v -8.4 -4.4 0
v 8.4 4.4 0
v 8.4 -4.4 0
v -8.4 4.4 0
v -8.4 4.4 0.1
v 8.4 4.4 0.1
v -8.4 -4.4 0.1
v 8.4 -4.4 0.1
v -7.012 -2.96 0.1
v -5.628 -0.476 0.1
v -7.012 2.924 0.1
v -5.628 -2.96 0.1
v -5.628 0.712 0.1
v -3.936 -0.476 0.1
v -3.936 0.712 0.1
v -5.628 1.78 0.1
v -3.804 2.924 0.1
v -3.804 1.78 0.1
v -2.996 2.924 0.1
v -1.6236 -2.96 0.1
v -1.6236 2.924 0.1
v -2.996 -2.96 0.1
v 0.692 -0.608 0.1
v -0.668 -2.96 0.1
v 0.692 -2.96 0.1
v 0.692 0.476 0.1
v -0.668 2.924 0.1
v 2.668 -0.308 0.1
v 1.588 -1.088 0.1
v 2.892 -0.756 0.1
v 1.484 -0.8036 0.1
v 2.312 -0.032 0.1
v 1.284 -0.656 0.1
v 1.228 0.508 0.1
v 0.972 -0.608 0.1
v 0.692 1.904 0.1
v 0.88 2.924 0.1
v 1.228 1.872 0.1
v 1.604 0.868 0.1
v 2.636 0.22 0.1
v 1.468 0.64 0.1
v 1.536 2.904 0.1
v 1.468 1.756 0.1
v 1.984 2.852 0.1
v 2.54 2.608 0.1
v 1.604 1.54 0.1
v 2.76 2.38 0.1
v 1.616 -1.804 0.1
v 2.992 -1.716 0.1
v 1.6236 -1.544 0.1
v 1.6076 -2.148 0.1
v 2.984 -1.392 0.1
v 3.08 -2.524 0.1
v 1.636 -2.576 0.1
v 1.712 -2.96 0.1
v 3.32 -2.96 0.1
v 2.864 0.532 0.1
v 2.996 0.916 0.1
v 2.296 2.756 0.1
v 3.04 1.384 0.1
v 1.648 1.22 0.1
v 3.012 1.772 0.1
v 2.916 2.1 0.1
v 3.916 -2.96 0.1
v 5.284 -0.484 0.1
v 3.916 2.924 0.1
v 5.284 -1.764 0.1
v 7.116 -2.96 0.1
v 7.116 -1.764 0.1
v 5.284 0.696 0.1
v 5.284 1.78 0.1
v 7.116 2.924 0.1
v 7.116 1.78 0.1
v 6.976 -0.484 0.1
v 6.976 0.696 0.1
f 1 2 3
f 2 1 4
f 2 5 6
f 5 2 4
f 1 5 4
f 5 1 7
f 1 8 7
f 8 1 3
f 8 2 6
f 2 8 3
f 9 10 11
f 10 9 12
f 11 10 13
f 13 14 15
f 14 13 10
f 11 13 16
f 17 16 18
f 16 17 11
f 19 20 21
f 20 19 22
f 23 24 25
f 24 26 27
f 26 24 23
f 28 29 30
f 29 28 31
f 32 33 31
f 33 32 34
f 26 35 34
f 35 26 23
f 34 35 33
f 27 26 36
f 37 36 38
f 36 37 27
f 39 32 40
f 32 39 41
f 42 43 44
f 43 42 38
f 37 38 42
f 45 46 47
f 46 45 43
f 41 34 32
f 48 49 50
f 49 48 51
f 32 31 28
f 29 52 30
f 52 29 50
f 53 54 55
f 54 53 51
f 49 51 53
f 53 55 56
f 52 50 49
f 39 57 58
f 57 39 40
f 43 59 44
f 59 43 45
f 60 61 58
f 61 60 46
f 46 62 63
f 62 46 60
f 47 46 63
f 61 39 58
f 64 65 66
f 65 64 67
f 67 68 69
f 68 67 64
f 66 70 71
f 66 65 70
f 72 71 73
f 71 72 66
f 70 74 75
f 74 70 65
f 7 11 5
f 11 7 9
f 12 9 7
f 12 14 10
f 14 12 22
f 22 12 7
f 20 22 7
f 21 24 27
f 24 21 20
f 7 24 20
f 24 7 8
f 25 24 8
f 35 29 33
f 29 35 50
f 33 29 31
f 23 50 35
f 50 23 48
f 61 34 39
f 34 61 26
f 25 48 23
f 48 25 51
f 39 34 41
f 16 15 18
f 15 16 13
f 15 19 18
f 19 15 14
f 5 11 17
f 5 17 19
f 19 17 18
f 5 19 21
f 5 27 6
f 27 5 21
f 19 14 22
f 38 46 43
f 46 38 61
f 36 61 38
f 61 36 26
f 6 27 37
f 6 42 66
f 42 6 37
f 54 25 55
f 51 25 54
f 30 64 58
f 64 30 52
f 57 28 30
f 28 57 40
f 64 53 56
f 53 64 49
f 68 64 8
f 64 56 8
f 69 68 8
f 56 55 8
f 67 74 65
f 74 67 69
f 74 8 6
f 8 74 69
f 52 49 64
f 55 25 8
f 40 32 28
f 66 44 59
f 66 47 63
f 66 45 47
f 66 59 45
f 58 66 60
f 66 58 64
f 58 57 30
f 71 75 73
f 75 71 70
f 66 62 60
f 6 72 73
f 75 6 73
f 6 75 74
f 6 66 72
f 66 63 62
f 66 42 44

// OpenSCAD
// file: ../p/box5-12.scad
use <../lib.scad>
function ldraw_lib__box5_12() = [
// 0 Box with 5 Faces without Any Edges
// 0 Name: box5-12.dat
// 0 Author: Chris Dee [cwdee]
// 0 !LDRAW_ORG Primitive UPDATE 2009-02
// 0 !LICENSE Licensed under CC BY 4.0 : see CAreadme.txt
// 
// 0 BFC CERTIFY CCW
  [0,"BFC","CERTIFY"],
  [0,"BFC","CCW"],
// 
// 0 !HISTORY 2009-09-03 [PTadmin] Official Update 2009-02
// 
// 
// 4 16 1 1 1 1 1 -1 -1 1 -1 -1 1 1
  [4,16,1,1,1,1,1,-1,-1,1,-1,-1,1,1],
// 4 16 -1 0 1 1 0 1 1 1 1 -1 1 1
  [4,16,-1,0,1,1,0,1,1,1,1,-1,1,1],
// 4 16 -1 0 -1 -1 0 1 -1 1 1 -1 1 -1
  [4,16,-1,0,-1,-1,0,1,-1,1,1,-1,1,-1],
// 4 16 1 0 -1 -1 0 -1 -1 1 -1 1 1 -1
  [4,16,1,0,-1,-1,0,-1,-1,1,-1,1,1,-1],
// 4 16 1 0 1 1 0 -1 1 1 -1 1 1 1
  [4,16,1,0,1,1,0,-1,1,1,-1,1,1,1],
// 0
];
module ldraw_lib__box5_12(step=0, col=false, unit=2/5, alt=false, line=0.2, solid=!$preview)
    makepoly(ldraw_lib__box5_12(), step=step, col=col, unit=unit, alt=alt, line=line, solid=solid);
ldraw_lib__box5_12(line=0.2);
// main file
use <../lib.scad>
use <../p/box5-12.scad>
function ldraw_lib__4262483c() = [
// 0 Sticker  1.1 x  2.1 with White "FIRE" on Transparent Background
// 0 Name: 4262483c.dat
// 0 Author: Takeshi Takahashi [RainbowDolphin]
// 0 !LDRAW_ORG Part UPDATE 2025-05
// 0 !LICENSE Licensed under CC BY 4.0 : see CAreadme.txt
// 
// 0 BFC CERTIFY CCW
  [0,"BFC","CERTIFY"],
  [0,"BFC","CCW"],
// 
// 0 !KEYWORDS BrickLink 7239stk01, Fire engine, Ladder truck, Rebrickable 52888
// 0 !KEYWORDS Set 7239
// 
// 0 !HISTORY 2025-05-28 [OrionP] Official Update 2025-05
// 
// 1 16 0 -0.25 0 21 0 0 0 0.25 0 0 0 11 box5-12.dat
  [1,16,0,-0.25,0,21,0,0,0,0.25,0,0,0,11, ldraw_lib__box5_12()],
// 0 BFC NOCLIP
  [0,"BFC","NOCLIP"],
// 4 15 -17.53 -0.25 -7.4 -14.07 -0.25 -7.4 -14.07 -0.25 -1.19 -17.53 -0.25 7.31
  [4,15,-17.53,-0.25,-7.4,-14.07,-0.25,-7.4,-14.07,-0.25,-1.19,-17.53,-0.25,7.31],
// 3 15 -17.53 -0.25 7.31 -14.07 -0.25 -1.19 -14.07 -0.25 1.78
  [3,15,-17.53,-0.25,7.31,-14.07,-0.25,-1.19,-14.07,-0.25,1.78],
// 4 15 -14.07 -0.25 1.78 -14.07 -0.25 -1.19 -9.84 -0.25 -1.19 -9.84 -0.25 1.78
  [4,15,-14.07,-0.25,1.78,-14.07,-0.25,-1.19,-9.84,-0.25,-1.19,-9.84,-0.25,1.78],
// 3 15 -17.53 -0.25 7.31 -14.07 -0.25 1.78 -14.07 -0.25 4.45
  [3,15,-17.53,-0.25,7.31,-14.07,-0.25,1.78,-14.07,-0.25,4.45],
// 4 15 -14.07 -0.25 4.45 -9.51 -0.25 4.45 -9.51 -0.25 7.31 -17.53 -0.25 7.31
  [4,15,-14.07,-0.25,4.45,-9.51,-0.25,4.45,-9.51,-0.25,7.31,-17.53,-0.25,7.31],
// 4 15 -7.49 -0.25 7.31 -7.49 -0.25 -7.4 -4.059 -0.25 -7.4 -4.059 -0.25 7.31
  [4,15,-7.49,-0.25,7.31,-7.49,-0.25,-7.4,-4.059,-0.25,-7.4,-4.059,-0.25,7.31],
// 3 15 1.73 -0.25 -1.52 -1.67 -0.25 -7.4 1.73 -0.25 -7.4
  [3,15,1.73,-0.25,-1.52,-1.67,-0.25,-7.4,1.73,-0.25,-7.4],
// 4 15 -1.67 -0.25 -7.4 1.73 -0.25 -1.52 1.73 -0.25 1.19 -1.67 -0.25 7.31
  [4,15,-1.67,-0.25,-7.4,1.73,-0.25,-1.52,1.73,-0.25,1.19,-1.67,-0.25,7.31],
// 4 15 6.67 -0.25 -0.77 3.71 -0.25 -2.009 3.97 -0.25 -2.72 7.23 -0.25 -1.89
  [4,15,6.67,-0.25,-0.77,3.71,-0.25,-2.009,3.97,-0.25,-2.72,7.23,-0.25,-1.89],
// 4 15 3.21 -0.25 -1.64 3.71 -0.25 -2.009 5.78 -0.25 -0.08 3.07 -0.25 1.27
  [4,15,3.21,-0.25,-1.64,3.71,-0.25,-2.009,5.78,-0.25,-0.08,3.07,-0.25,1.27],
// 4 15 2.43 -0.25 -1.52 3.07 -0.25 1.27 1.73 -0.25 1.19 1.73 -0.25 -1.52
  [4,15,2.43,-0.25,-1.52,3.07,-0.25,1.27,1.73,-0.25,1.19,1.73,-0.25,-1.52],
// 3 15 3.07 -0.25 1.27 2.43 -0.25 -1.52 3.21 -0.25 -1.64
  [3,15,3.07,-0.25,1.27,2.43,-0.25,-1.52,3.21,-0.25,-1.64],
// 3 15 -1.67 -0.25 7.31 1.73 -0.25 1.19 1.73 -0.25 4.76
  [3,15,-1.67,-0.25,7.31,1.73,-0.25,1.19,1.73,-0.25,4.76],
// 4 15 2.2 -0.25 7.31 -1.67 -0.25 7.31 1.73 -0.25 4.76 3.07 -0.25 4.68
  [4,15,2.2,-0.25,7.31,-1.67,-0.25,7.31,1.73,-0.25,4.76,3.07,-0.25,4.68],
// 4 15 4.01 -0.25 2.17 3.67 -0.25 1.6 5.78 -0.25 -0.08 6.59 -0.25 0.55
  [4,15,4.01,-0.25,2.17,3.67,-0.25,1.6,5.78,-0.25,-0.08,6.59,-0.25,0.55],
// 4 15 3.84 -0.25 7.26 3.07 -0.25 4.68 3.67 -0.25 4.39 4.96 -0.25 7.13
  [4,15,3.84,-0.25,7.26,3.07,-0.25,4.68,3.67,-0.25,4.39,4.96,-0.25,7.13],
// 3 15 2.2 -0.25 7.31 3.07 -0.25 4.68 3.84 -0.25 7.26
  [3,15,2.2,-0.25,7.31,3.07,-0.25,4.68,3.84,-0.25,7.26],
// 4 15 6.35 -0.25 6.52 3.67 -0.25 4.39 4.01 -0.25 3.85 6.9 -0.25 5.95
  [4,15,6.35,-0.25,6.52,3.67,-0.25,4.39,4.01,-0.25,3.85,6.9,-0.25,5.95],
// 3 15 3.67 -0.25 1.6 3.07 -0.25 1.27 5.78 -0.25 -0.08
  [3,15,3.67,-0.25,1.6,3.07,-0.25,1.27,5.78,-0.25,-0.08],
// 4 15 4.04 -0.25 -4.51 4.019 -0.25 -5.37 7.48 -0.25 -4.29 4.059 -0.25 -3.86
  [4,15,4.04,-0.25,-4.51,4.019,-0.25,-5.37,7.48,-0.25,-4.29,4.059,-0.25,-3.86],
// 3 15 5.78 -0.25 -0.08 3.71 -0.25 -2.009 6.67 -0.25 -0.77
  [3,15,5.78,-0.25,-0.08,3.71,-0.25,-2.009,6.67,-0.25,-0.77],
// 4 15 3.97 -0.25 -2.72 4.059 -0.25 -3.86 7.46 -0.25 -3.48 7.23 -0.25 -1.89
  [4,15,3.97,-0.25,-2.72,4.059,-0.25,-3.86,7.46,-0.25,-3.48,7.23,-0.25,-1.89],
// 4 15 4.09 -0.25 -6.44 4.28 -0.25 -7.4 7.7 -0.25 -6.31 4.019 -0.25 -5.37
  [4,15,4.09,-0.25,-6.44,4.28,-0.25,-7.4,7.7,-0.25,-6.31,4.019,-0.25,-5.37],
// 3 15 7.48 -0.25 -4.29 4.019 -0.25 -5.37 7.7 -0.25 -6.31
  [3,15,7.48,-0.25,-4.29,4.019,-0.25,-5.37,7.7,-0.25,-6.31],
// 3 15 7.7 -0.25 -6.31 4.28 -0.25 -7.4 8.3 -0.25 -7.4
  [3,15,7.7,-0.25,-6.31,4.28,-0.25,-7.4,8.3,-0.25,-7.4],
// 3 15 7.46 -0.25 -3.48 4.059 -0.25 -3.86 7.48 -0.25 -4.29
  [3,15,7.46,-0.25,-3.48,4.059,-0.25,-3.86,7.48,-0.25,-4.29],
// 4 15 4.01 -0.25 2.17 6.59 -0.25 0.55 7.16 -0.25 1.33 7.49 -0.25 2.29
  [4,15,4.01,-0.25,2.17,6.59,-0.25,0.55,7.16,-0.25,1.33,7.49,-0.25,2.29],
// 4 15 5.74 -0.25 6.89 4.96 -0.25 7.13 3.67 -0.25 4.39 6.35 -0.25 6.52
  [4,15,5.74,-0.25,6.89,4.96,-0.25,7.13,3.67,-0.25,4.39,6.35,-0.25,6.52],
// 4 15 7.6 -0.25 3.46 4.01 -0.25 3.85 4.12 -0.25 3.05 7.49 -0.25 2.29
  [4,15,7.6,-0.25,3.46,4.01,-0.25,3.85,4.12,-0.25,3.05,7.49,-0.25,2.29],
// 4 15 4.01 -0.25 3.85 7.6 -0.25 3.46 7.53 -0.25 4.43 7.29 -0.25 5.25
  [4,15,4.01,-0.25,3.85,7.6,-0.25,3.46,7.53,-0.25,4.43,7.29,-0.25,5.25],
// 3 15 6.9 -0.25 5.95 4.01 -0.25 3.85 7.29 -0.25 5.25
  [3,15,6.9,-0.25,5.95,4.01,-0.25,3.85,7.29,-0.25,5.25],
// 3 15 4.12 -0.25 3.05 4.01 -0.25 2.17 7.49 -0.25 2.29
  [3,15,4.12,-0.25,3.05,4.01,-0.25,2.17,7.49,-0.25,2.29],
// 4 15 9.79 -0.25 -7.4 13.21 -0.25 -4.41 13.21 -0.25 -1.21 9.79 -0.25 7.31
  [4,15,9.79,-0.25,-7.4,13.21,-0.25,-4.41,13.21,-0.25,-1.21,9.79,-0.25,7.31],
// 4 15 13.21 -0.25 -4.41 9.79 -0.25 -7.4 17.79 -0.25 -7.4 17.79 -0.25 -4.41
  [4,15,13.21,-0.25,-4.41,9.79,-0.25,-7.4,17.79,-0.25,-7.4,17.79,-0.25,-4.41],
// 3 15 9.79 -0.25 7.31 13.21 -0.25 1.74 13.21 -0.25 4.45
  [3,15,9.79,-0.25,7.31,13.21,-0.25,1.74,13.21,-0.25,4.45],
// 3 15 9.79 -0.25 7.31 13.21 -0.25 -1.21 13.21 -0.25 1.74
  [3,15,9.79,-0.25,7.31,13.21,-0.25,-1.21,13.21,-0.25,1.74],
// 4 15 17.79 -0.25 7.31 9.79 -0.25 7.31 13.21 -0.25 4.45 17.79 -0.25 4.45
  [4,15,17.79,-0.25,7.31,9.79,-0.25,7.31,13.21,-0.25,4.45,17.79,-0.25,4.45],
// 4 15 13.21 -0.25 1.74 13.21 -0.25 -1.21 17.44 -0.25 -1.21 17.44 -0.25 1.74
  [4,15,13.21,-0.25,1.74,13.21,-0.25,-1.21,17.44,-0.25,-1.21,17.44,-0.25,1.74],
// 0 BFC CLIP
  [0,"BFC","CLIP"],
// 4 16 -21 -0.25 -11 -17.53 -0.25 -7.4 -17.53 -0.25 7.31 -21 -0.25 11
  [4,16,-21,-0.25,-11,-17.53,-0.25,-7.4,-17.53,-0.25,7.31,-21,-0.25,11],
// 3 16 -14.07 -0.25 -7.4 -17.53 -0.25 -7.4 -21 -0.25 -11
  [3,16,-14.07,-0.25,-7.4,-17.53,-0.25,-7.4,-21,-0.25,-11],
// 4 16 -14.07 -0.25 -7.4 -7.49 -0.25 -7.4 -9.84 -0.25 -1.19 -14.07 -0.25 -1.19
  [4,16,-14.07,-0.25,-7.4,-7.49,-0.25,-7.4,-9.84,-0.25,-1.19,-14.07,-0.25,-1.19],
// 3 16 -7.49 -0.25 -7.4 -14.07 -0.25 -7.4 -21 -0.25 -11
  [3,16,-7.49,-0.25,-7.4,-14.07,-0.25,-7.4,-21,-0.25,-11],
// 3 16 -4.059 -0.25 -7.4 -7.49 -0.25 -7.4 -21 -0.25 -11
  [3,16,-4.059,-0.25,-7.4,-7.49,-0.25,-7.4,-21,-0.25,-11],
// 4 16 -1.67 -0.25 7.31 -4.059 -0.25 7.31 -4.059 -0.25 -7.4 -1.67 -0.25 -7.4
  [4,16,-1.67,-0.25,7.31,-4.059,-0.25,7.31,-4.059,-0.25,-7.4,-1.67,-0.25,-7.4],
// 4 16 -1.67 -0.25 -7.4 -4.059 -0.25 -7.4 -21 -0.25 -11 21 -0.25 -11
  [4,16,-1.67,-0.25,-7.4,-4.059,-0.25,-7.4,-21,-0.25,-11,21,-0.25,-11],
// 3 16 1.73 -0.25 -7.4 -1.67 -0.25 -7.4 21 -0.25 -11
  [3,16,1.73,-0.25,-7.4,-1.67,-0.25,-7.4,21,-0.25,-11],
// 4 16 2.43 -0.25 -1.52 4.059 -0.25 -3.86 3.97 -0.25 -2.72 3.21 -0.25 -1.64
  [4,16,2.43,-0.25,-1.52,4.059,-0.25,-3.86,3.97,-0.25,-2.72,3.21,-0.25,-1.64],
// 3 16 3.21 -0.25 -1.64 3.97 -0.25 -2.72 3.71 -0.25 -2.009
  [3,16,3.21,-0.25,-1.64,3.97,-0.25,-2.72,3.71,-0.25,-2.009],
// 4 16 4.059 -0.25 -3.86 2.43 -0.25 -1.52 1.73 -0.25 -1.52 4.04 -0.25 -4.51
  [4,16,4.059,-0.25,-3.86,2.43,-0.25,-1.52,1.73,-0.25,-1.52,4.04,-0.25,-4.51],
// 4 16 4.12 -0.25 3.05 1.73 -0.25 1.19 3.07 -0.25 1.27 4.01 -0.25 2.17
  [4,16,4.12,-0.25,3.05,1.73,-0.25,1.19,3.07,-0.25,1.27,4.01,-0.25,2.17],
// 4 16 4.04 -0.25 -4.51 1.73 -0.25 -1.52 1.73 -0.25 -7.4 4.019 -0.25 -5.37
  [4,16,4.04,-0.25,-4.51,1.73,-0.25,-1.52,1.73,-0.25,-7.4,4.019,-0.25,-5.37],
// 3 16 4.01 -0.25 2.17 3.07 -0.25 1.27 3.67 -0.25 1.6
  [3,16,4.01,-0.25,2.17,3.07,-0.25,1.27,3.67,-0.25,1.6],
// 4 16 -14.07 -0.25 4.45 -14.07 -0.25 1.78 -9.84 -0.25 1.78 -9.51 -0.25 4.45
  [4,16,-14.07,-0.25,4.45,-14.07,-0.25,1.78,-9.84,-0.25,1.78,-9.51,-0.25,4.45],
// 4 16 -9.84 -0.25 1.78 -9.84 -0.25 -1.19 -7.49 -0.25 7.31 -9.51 -0.25 4.45
  [4,16,-9.84,-0.25,1.78,-9.84,-0.25,-1.19,-7.49,-0.25,7.31,-9.51,-0.25,4.45],
// 3 16 -21 -0.25 11 -17.53 -0.25 7.31 -9.51 -0.25 7.31
  [3,16,-21,-0.25,11,-17.53,-0.25,7.31,-9.51,-0.25,7.31],
// 3 16 -21 -0.25 11 -9.51 -0.25 7.31 -7.49 -0.25 7.31
  [3,16,-21,-0.25,11,-9.51,-0.25,7.31,-7.49,-0.25,7.31],
// 3 16 -7.49 -0.25 7.31 -9.51 -0.25 7.31 -9.51 -0.25 4.45
  [3,16,-7.49,-0.25,7.31,-9.51,-0.25,7.31,-9.51,-0.25,4.45],
// 3 16 -21 -0.25 11 -7.49 -0.25 7.31 -4.059 -0.25 7.31
  [3,16,-21,-0.25,11,-7.49,-0.25,7.31,-4.059,-0.25,7.31],
// 4 16 -21 -0.25 11 -4.059 -0.25 7.31 -1.67 -0.25 7.31 21 -0.25 11
  [4,16,-21,-0.25,11,-4.059,-0.25,7.31,-1.67,-0.25,7.31,21,-0.25,11],
// 3 16 -7.49 -0.25 7.31 -9.84 -0.25 -1.19 -7.49 -0.25 -7.4
  [3,16,-7.49,-0.25,7.31,-9.84,-0.25,-1.19,-7.49,-0.25,-7.4],
// 4 16 3.07 -0.25 4.68 4.12 -0.25 3.05 4.01 -0.25 3.85 3.67 -0.25 4.39
  [4,16,3.07,-0.25,4.68,4.12,-0.25,3.05,4.01,-0.25,3.85,3.67,-0.25,4.39],
// 4 16 4.12 -0.25 3.05 3.07 -0.25 4.68 1.73 -0.25 4.76 1.73 -0.25 1.19
  [4,16,4.12,-0.25,3.05,3.07,-0.25,4.68,1.73,-0.25,4.76,1.73,-0.25,1.19],
// 3 16 21 -0.25 11 -1.67 -0.25 7.31 2.2 -0.25 7.31
  [3,16,21,-0.25,11,-1.67,-0.25,7.31,2.2,-0.25,7.31],
// 4 16 21 -0.25 11 2.2 -0.25 7.31 3.84 -0.25 7.26 9.79 -0.25 7.31
  [4,16,21,-0.25,11,2.2,-0.25,7.31,3.84,-0.25,7.26,9.79,-0.25,7.31],
// 3 16 4.09 -0.25 -6.44 1.73 -0.25 -7.4 4.28 -0.25 -7.4
  [3,16,4.09,-0.25,-6.44,1.73,-0.25,-7.4,4.28,-0.25,-7.4],
// 3 16 4.019 -0.25 -5.37 1.73 -0.25 -7.4 4.09 -0.25 -6.44
  [3,16,4.019,-0.25,-5.37,1.73,-0.25,-7.4,4.09,-0.25,-6.44],
// 4 16 7.23 -0.25 -1.89 7.46 -0.25 -3.48 9.79 -0.25 -7.4 7.49 -0.25 2.29
  [4,16,7.23,-0.25,-1.89,7.46,-0.25,-3.48,9.79,-0.25,-7.4,7.49,-0.25,2.29],
// 4 16 6.67 -0.25 -0.77 7.23 -0.25 -1.89 7.16 -0.25 1.33 6.59 -0.25 0.55
  [4,16,6.67,-0.25,-0.77,7.23,-0.25,-1.89,7.16,-0.25,1.33,6.59,-0.25,0.55],
// 4 16 7.7 -0.25 -6.31 8.3 -0.25 -7.4 9.79 -0.25 -7.4 7.48 -0.25 -4.29
  [4,16,7.7,-0.25,-6.31,8.3,-0.25,-7.4,9.79,-0.25,-7.4,7.48,-0.25,-4.29],
// 3 16 17.79 -0.25 -7.4 9.79 -0.25 -7.4 21 -0.25 -11
  [3,16,17.79,-0.25,-7.4,9.79,-0.25,-7.4,21,-0.25,-11],
// 3 16 9.79 -0.25 -7.4 8.3 -0.25 -7.4 21 -0.25 -11
  [3,16,9.79,-0.25,-7.4,8.3,-0.25,-7.4,21,-0.25,-11],
// 3 16 17.79 -0.25 -4.41 17.79 -0.25 -7.4 21 -0.25 -11
  [3,16,17.79,-0.25,-4.41,17.79,-0.25,-7.4,21,-0.25,-11],
// 3 16 8.3 -0.25 -7.4 4.28 -0.25 -7.4 21 -0.25 -11
  [3,16,8.3,-0.25,-7.4,4.28,-0.25,-7.4,21,-0.25,-11],
// 4 16 17.44 -0.25 -1.21 13.21 -0.25 -1.21 13.21 -0.25 -4.41 17.79 -0.25 -4.41
  [4,16,17.44,-0.25,-1.21,13.21,-0.25,-1.21,13.21,-0.25,-4.41,17.79,-0.25,-4.41],
// 4 16 17.44 -0.25 -1.21 17.79 -0.25 -4.41 21 -0.25 -11 21 -0.25 11
  [4,16,17.44,-0.25,-1.21,17.79,-0.25,-4.41,21,-0.25,-11,21,-0.25,11],
// 3 16 7.46 -0.25 -3.48 7.48 -0.25 -4.29 9.79 -0.25 -7.4
  [3,16,7.46,-0.25,-3.48,7.48,-0.25,-4.29,9.79,-0.25,-7.4],
// 3 16 4.28 -0.25 -7.4 1.73 -0.25 -7.4 21 -0.25 -11
  [3,16,4.28,-0.25,-7.4,1.73,-0.25,-7.4,21,-0.25,-11],
// 3 16 6.59 -0.25 0.55 5.78 -0.25 -0.08 6.67 -0.25 -0.77
  [3,16,6.59,-0.25,0.55,5.78,-0.25,-0.08,6.67,-0.25,-0.77],
// 3 16 9.79 -0.25 7.31 4.96 -0.25 7.13 5.74 -0.25 6.89
  [3,16,9.79,-0.25,7.31,4.96,-0.25,7.13,5.74,-0.25,6.89],
// 3 16 9.79 -0.25 7.31 6.9 -0.25 5.95 7.29 -0.25 5.25
  [3,16,9.79,-0.25,7.31,6.9,-0.25,5.95,7.29,-0.25,5.25],
// 3 16 9.79 -0.25 7.31 6.35 -0.25 6.52 6.9 -0.25 5.95
  [3,16,9.79,-0.25,7.31,6.35,-0.25,6.52,6.9,-0.25,5.95],
// 3 16 9.79 -0.25 7.31 5.74 -0.25 6.89 6.35 -0.25 6.52
  [3,16,9.79,-0.25,7.31,5.74,-0.25,6.89,6.35,-0.25,6.52],
// 4 16 7.49 -0.25 2.29 9.79 -0.25 -7.4 9.79 -0.25 7.31 7.6 -0.25 3.46
  [4,16,7.49,-0.25,2.29,9.79,-0.25,-7.4,9.79,-0.25,7.31,7.6,-0.25,3.46],
// 3 16 7.49 -0.25 2.29 7.16 -0.25 1.33 7.23 -0.25 -1.89
  [3,16,7.49,-0.25,2.29,7.16,-0.25,1.33,7.23,-0.25,-1.89],
// 4 16 13.21 -0.25 4.45 13.21 -0.25 1.74 17.44 -0.25 1.74 17.79 -0.25 4.45
  [4,16,13.21,-0.25,4.45,13.21,-0.25,1.74,17.44,-0.25,1.74,17.79,-0.25,4.45],
// 3 16 9.79 -0.25 7.31 7.53 -0.25 4.43 7.6 -0.25 3.46
  [3,16,9.79,-0.25,7.31,7.53,-0.25,4.43,7.6,-0.25,3.46],
// 3 16 21 -0.25 11 17.79 -0.25 7.31 17.79 -0.25 4.45
  [3,16,21,-0.25,11,17.79,-0.25,7.31,17.79,-0.25,4.45],
// 4 16 21 -0.25 11 17.79 -0.25 4.45 17.44 -0.25 1.74 17.44 -0.25 -1.21
  [4,16,21,-0.25,11,17.79,-0.25,4.45,17.44,-0.25,1.74,17.44,-0.25,-1.21],
// 3 16 21 -0.25 11 9.79 -0.25 7.31 17.79 -0.25 7.31
  [3,16,21,-0.25,11,9.79,-0.25,7.31,17.79,-0.25,7.31],
// 3 16 9.79 -0.25 7.31 7.29 -0.25 5.25 7.53 -0.25 4.43
  [3,16,9.79,-0.25,7.31,7.29,-0.25,5.25,7.53,-0.25,4.43],
// 3 16 9.79 -0.25 7.31 3.84 -0.25 7.26 4.96 -0.25 7.13
  [3,16,9.79,-0.25,7.31,3.84,-0.25,7.26,4.96,-0.25,7.13],
];
module ldraw_lib__4262483c(step=0, col=false, unit=2/5, alt=false, line=0.2, solid=!$preview)
    makepoly(ldraw_lib__4262483c(), step=step, col=col, unit=unit, alt=alt, line=line, solid=solid);
ldraw_lib__4262483c(line=0.2);
